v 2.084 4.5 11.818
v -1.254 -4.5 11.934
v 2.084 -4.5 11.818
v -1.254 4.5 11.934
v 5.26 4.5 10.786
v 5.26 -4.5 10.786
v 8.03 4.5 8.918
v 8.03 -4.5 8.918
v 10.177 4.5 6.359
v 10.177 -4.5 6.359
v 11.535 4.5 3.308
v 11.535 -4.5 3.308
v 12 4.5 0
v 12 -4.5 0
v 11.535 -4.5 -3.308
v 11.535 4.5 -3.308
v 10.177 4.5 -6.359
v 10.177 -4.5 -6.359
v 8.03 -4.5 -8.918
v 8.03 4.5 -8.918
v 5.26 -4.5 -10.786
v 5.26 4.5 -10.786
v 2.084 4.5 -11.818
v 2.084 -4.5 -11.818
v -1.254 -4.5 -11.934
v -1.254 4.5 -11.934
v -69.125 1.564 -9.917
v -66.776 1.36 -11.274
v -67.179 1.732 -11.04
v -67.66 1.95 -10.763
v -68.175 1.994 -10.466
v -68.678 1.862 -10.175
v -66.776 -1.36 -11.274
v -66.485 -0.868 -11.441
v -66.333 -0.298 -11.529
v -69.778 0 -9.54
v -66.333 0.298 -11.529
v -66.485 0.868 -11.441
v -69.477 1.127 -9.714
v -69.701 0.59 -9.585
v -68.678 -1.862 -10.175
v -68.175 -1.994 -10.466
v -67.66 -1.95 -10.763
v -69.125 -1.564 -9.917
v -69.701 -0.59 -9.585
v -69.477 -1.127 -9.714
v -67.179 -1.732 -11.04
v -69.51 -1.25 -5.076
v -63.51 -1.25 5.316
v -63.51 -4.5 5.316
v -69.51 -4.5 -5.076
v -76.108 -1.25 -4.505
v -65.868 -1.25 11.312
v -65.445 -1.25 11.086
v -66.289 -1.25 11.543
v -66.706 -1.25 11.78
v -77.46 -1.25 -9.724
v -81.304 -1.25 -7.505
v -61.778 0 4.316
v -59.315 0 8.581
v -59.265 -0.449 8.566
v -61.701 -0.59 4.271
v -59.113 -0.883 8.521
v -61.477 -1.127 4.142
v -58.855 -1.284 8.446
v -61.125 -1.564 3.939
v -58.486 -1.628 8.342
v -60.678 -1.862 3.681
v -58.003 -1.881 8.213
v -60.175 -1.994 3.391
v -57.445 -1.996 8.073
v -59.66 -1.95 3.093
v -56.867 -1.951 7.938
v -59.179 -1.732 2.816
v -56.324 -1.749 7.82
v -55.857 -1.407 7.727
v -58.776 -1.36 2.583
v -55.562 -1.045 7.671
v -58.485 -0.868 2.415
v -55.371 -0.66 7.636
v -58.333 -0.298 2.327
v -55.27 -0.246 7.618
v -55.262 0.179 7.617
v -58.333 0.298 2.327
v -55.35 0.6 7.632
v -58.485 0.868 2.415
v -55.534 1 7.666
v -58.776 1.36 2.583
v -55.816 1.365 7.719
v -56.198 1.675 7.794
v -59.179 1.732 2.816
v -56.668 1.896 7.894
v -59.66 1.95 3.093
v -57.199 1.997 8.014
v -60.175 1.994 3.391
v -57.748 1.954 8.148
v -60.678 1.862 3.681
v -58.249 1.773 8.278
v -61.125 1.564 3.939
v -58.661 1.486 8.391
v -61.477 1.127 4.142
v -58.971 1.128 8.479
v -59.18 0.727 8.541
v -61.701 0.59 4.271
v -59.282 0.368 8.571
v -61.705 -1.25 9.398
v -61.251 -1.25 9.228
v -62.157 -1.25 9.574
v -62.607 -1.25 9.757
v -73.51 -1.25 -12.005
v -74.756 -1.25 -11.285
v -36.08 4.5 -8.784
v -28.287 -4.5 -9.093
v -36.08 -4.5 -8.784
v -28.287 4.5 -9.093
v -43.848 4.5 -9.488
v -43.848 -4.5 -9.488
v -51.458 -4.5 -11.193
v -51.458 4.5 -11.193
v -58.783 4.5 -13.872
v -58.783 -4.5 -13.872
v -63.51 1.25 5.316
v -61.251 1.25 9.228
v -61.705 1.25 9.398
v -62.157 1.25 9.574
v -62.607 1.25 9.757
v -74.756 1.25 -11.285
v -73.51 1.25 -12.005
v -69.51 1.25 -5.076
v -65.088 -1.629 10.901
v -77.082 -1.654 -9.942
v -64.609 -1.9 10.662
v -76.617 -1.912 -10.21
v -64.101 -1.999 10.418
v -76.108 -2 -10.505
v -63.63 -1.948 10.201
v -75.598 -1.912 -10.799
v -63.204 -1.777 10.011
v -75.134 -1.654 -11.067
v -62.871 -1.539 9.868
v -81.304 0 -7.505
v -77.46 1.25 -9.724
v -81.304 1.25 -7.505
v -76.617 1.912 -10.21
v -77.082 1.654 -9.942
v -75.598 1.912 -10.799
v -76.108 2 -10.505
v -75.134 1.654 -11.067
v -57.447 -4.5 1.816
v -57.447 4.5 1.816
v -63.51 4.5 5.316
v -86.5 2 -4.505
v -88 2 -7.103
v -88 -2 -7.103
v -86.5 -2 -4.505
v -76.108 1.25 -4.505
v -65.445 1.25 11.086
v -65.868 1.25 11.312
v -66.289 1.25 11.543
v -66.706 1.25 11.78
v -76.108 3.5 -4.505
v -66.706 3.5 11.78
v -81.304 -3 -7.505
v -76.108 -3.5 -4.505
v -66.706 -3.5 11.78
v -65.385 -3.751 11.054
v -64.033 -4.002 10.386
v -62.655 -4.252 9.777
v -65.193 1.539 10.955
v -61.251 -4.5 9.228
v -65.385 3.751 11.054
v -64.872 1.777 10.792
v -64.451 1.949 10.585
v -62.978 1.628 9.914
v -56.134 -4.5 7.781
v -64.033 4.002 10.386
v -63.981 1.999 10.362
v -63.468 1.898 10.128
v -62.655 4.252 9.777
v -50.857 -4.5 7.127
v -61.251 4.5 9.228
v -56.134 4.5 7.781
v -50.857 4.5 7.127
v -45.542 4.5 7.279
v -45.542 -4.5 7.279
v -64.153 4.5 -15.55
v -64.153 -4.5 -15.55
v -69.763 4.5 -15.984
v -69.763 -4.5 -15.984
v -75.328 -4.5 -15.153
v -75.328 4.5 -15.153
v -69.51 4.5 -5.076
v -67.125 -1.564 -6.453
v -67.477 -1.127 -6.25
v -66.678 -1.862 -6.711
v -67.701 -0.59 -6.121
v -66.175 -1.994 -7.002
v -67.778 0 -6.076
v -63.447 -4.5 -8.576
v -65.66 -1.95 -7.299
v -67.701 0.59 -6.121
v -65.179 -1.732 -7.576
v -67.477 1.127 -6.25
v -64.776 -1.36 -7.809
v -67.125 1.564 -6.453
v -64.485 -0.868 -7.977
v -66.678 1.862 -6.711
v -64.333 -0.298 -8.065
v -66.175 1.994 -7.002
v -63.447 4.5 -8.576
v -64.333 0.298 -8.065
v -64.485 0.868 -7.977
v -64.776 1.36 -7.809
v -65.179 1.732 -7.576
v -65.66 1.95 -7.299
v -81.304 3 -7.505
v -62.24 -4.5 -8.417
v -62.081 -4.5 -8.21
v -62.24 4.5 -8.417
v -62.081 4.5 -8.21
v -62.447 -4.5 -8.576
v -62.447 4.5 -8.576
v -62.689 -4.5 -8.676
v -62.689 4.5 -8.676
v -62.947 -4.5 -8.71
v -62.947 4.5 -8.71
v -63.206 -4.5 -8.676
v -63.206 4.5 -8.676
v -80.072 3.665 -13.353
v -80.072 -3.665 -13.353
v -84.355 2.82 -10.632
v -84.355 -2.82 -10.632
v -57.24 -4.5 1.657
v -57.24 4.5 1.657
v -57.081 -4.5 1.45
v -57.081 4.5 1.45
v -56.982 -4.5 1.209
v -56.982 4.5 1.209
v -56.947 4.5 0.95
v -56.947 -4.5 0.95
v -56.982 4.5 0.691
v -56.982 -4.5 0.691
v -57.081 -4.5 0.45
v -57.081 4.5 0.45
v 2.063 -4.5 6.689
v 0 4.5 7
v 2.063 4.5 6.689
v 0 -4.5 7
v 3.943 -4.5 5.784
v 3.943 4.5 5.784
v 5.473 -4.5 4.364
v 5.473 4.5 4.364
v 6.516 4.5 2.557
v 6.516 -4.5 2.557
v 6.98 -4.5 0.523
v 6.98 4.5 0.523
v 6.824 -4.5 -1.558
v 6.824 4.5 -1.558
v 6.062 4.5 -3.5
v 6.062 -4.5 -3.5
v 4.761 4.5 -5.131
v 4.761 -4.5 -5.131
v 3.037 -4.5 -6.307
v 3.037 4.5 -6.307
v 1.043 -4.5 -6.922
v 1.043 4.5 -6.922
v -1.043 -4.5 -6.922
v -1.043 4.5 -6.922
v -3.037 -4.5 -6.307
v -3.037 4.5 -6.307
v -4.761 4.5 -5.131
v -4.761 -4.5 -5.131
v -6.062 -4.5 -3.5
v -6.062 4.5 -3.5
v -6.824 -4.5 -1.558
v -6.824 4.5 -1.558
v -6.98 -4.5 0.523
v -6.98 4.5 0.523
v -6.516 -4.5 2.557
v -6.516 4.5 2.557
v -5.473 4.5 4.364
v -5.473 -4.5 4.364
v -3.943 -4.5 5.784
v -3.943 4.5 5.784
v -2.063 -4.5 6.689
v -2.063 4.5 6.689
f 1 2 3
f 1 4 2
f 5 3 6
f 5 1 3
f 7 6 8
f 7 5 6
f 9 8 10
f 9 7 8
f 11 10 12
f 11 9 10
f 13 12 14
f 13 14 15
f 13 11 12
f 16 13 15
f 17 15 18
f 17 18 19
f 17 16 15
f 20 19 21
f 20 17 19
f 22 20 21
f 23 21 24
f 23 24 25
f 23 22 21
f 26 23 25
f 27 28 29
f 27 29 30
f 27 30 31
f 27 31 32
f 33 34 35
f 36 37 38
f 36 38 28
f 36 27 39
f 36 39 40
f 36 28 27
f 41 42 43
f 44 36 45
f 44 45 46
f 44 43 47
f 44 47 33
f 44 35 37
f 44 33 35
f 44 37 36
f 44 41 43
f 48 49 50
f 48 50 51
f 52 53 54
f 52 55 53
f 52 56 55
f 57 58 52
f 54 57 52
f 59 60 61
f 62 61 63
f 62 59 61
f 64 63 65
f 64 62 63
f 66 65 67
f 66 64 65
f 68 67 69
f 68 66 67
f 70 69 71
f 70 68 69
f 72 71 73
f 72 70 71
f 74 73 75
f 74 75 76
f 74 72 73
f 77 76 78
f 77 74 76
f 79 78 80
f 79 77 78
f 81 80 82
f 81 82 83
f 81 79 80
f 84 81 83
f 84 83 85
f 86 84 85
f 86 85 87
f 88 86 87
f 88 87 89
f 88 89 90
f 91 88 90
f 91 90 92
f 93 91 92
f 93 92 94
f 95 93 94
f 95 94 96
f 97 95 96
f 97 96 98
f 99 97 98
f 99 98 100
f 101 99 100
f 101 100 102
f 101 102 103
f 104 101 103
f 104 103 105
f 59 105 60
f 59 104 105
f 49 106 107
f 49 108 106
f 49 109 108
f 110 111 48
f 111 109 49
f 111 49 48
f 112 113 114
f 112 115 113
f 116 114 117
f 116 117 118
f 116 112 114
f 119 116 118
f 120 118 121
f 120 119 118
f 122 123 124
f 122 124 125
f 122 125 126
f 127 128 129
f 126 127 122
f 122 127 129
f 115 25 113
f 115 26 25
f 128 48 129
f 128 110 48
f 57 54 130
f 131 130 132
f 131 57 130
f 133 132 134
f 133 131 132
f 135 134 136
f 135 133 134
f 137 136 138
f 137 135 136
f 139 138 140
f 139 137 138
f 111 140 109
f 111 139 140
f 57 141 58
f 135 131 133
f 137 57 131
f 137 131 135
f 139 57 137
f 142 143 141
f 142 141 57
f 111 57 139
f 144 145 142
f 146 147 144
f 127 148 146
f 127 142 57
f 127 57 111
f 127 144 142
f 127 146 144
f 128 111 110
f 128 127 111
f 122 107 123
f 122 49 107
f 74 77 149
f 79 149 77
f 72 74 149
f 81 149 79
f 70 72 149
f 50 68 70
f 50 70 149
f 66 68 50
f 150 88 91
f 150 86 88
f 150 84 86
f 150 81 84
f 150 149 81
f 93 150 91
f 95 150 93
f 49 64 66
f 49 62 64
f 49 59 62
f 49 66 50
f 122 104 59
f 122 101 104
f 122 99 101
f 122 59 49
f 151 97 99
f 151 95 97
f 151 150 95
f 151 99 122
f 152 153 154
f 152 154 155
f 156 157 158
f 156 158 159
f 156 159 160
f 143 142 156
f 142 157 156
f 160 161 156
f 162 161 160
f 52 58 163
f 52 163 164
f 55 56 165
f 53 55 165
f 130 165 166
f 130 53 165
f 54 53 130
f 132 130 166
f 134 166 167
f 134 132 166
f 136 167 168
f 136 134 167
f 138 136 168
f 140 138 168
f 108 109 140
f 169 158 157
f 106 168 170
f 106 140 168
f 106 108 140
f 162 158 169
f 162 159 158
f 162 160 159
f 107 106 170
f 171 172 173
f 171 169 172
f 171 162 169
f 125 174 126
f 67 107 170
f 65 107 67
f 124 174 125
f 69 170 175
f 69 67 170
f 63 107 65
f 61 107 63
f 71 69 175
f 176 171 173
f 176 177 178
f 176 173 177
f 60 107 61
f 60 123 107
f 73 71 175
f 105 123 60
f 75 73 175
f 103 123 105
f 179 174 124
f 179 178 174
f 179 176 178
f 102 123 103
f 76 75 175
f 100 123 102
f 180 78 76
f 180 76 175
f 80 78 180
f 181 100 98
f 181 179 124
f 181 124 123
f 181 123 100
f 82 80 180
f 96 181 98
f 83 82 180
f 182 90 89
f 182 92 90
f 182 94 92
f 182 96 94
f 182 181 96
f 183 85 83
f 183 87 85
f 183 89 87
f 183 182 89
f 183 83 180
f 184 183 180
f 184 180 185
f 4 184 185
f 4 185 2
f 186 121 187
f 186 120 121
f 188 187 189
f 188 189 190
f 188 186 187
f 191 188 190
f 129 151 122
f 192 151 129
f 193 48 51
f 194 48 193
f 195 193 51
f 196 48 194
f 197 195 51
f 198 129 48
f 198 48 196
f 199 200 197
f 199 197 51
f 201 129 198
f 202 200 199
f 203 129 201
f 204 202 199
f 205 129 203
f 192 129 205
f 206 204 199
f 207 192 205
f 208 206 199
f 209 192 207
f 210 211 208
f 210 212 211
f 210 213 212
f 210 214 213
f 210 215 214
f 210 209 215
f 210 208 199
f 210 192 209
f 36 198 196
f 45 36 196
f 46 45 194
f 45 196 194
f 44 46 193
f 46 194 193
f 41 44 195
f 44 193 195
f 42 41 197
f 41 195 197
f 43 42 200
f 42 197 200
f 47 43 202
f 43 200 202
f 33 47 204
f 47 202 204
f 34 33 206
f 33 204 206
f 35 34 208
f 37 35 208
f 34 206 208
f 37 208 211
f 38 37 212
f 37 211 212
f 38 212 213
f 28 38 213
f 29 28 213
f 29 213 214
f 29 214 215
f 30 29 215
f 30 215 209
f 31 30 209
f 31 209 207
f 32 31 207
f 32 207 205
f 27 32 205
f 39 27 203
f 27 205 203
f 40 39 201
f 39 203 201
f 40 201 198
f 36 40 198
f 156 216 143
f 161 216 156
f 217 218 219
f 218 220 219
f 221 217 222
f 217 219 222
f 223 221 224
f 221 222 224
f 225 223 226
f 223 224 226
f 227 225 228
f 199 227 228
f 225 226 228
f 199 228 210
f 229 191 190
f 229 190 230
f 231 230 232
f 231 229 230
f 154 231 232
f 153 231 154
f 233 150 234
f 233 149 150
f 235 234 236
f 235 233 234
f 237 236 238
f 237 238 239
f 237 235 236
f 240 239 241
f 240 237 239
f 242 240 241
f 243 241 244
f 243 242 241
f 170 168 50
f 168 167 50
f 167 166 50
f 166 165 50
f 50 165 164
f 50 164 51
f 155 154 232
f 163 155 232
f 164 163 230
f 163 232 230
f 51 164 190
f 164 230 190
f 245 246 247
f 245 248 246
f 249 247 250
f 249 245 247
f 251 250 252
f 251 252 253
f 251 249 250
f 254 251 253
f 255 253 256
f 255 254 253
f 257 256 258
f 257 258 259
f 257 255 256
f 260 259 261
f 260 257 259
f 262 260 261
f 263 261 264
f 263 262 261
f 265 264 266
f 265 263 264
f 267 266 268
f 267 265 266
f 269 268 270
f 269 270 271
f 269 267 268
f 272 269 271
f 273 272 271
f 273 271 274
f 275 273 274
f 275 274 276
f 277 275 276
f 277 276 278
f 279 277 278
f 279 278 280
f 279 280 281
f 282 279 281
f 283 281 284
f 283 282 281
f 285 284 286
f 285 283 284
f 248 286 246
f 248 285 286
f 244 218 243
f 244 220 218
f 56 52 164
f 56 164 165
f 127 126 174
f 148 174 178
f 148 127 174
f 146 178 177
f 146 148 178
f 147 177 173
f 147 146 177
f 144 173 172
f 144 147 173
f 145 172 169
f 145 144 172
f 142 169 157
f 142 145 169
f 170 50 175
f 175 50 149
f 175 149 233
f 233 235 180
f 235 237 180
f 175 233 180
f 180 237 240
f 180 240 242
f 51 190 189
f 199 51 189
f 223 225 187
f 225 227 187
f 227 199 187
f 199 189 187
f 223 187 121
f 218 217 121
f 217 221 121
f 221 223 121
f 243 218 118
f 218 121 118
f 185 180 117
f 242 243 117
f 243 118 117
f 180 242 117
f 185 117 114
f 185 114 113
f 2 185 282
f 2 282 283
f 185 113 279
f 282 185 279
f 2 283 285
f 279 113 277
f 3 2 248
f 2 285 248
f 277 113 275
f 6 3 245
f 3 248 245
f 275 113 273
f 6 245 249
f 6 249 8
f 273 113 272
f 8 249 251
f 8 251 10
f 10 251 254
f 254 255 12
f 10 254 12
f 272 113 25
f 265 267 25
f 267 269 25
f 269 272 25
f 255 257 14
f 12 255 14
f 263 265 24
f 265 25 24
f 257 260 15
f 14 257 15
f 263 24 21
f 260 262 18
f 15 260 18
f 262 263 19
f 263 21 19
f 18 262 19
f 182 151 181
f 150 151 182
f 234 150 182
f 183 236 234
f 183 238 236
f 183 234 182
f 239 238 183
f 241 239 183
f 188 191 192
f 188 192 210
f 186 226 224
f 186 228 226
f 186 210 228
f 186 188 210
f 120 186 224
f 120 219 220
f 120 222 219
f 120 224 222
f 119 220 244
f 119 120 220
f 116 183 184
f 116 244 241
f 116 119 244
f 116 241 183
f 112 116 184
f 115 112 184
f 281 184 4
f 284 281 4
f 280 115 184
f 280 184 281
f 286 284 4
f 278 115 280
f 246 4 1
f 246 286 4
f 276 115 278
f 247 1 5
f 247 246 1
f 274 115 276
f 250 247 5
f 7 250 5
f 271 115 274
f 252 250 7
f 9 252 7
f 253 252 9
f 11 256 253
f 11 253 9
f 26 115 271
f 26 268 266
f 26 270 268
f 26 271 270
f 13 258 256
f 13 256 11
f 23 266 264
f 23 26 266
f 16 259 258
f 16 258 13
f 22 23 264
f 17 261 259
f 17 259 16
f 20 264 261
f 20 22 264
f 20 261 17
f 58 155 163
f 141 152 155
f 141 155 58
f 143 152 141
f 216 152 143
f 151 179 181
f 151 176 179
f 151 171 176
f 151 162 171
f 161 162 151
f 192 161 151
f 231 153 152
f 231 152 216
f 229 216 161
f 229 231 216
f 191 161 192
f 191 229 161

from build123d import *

# Parameters (mm, degrees)
SKETCH1_R                           = 7
BOSS_EXTRUDE1_DEPTH                 = 4.5
SKETCH2_R                           = 2
CUT_EXTRUDE1_DEPTH                  = 4
CUT_EXTRUDE1_DIRECTION_2_REACH      = 84.52
CUT_EXTRUDE1_DIRECTION_2_END_RADIUS = 35
CUT_EXTRUDE2_REACH                  = 85.44
CUT_EXTRUDE3_DEPTH                  = 84.439778024
CUT_EXTRUDE3_DEPTH_BACK             = 84.439778024
FILLET1_R                           = 1


with BuildPart() as part:
    # Sketch1 → Boss-Extrude1 (new, symmetric)
    # profile 1 of 2: a face of its own
    with BuildSketch(Plane(origin=(0, 0, 0), x_dir=(1, 0, 0), z_dir=(0, 1, 0))):
        with BuildLine():
            Line((-1.254341559, 11.934262744), (-28.287114055, 9.093003864))
            ThreePointArc((-28.287114055, 9.093003864), (-43.847711602, 9.487707298), (-58.78314626, 13.871858114))
            ThreePointArc((-58.78314626, 13.871858114), (-66.945926578, 15.925337372), (-75.327562788, 15.153369736))
            Line((-75.327562788, 15.153369736), (-69.509618943, 5.076395401))
            Line((-69.509618943, 5.076395401), (-62.581415713, 9.076395401))
            Line((-62.581415713, 9.076395401), (-56.581415713, -1.315909444))
            Line((-56.581415713, -1.315909444), (-63.509618943, -5.315909444))
            Line((-63.509618943, -5.315909444), (-61.251109949, -9.227761772))
            ThreePointArc((-61.251109949, -9.227761772), (-53.508040015, -7.353839298), (-45.541787079, -7.279464651))
            Line((-45.541787079, -7.279464651), (-1.254341559, -11.934262744))
            ThreePointArc((-1.254341559, -11.934262744), (12, 0), (-1.254341559, 11.934262744))
        make_face()
        with Locations(Location((0, 0, 0), (0, 0, 270))):
            Circle(SKETCH1_R, mode=Mode.SUBTRACT)
    # profile 2 of 2: a face of its own
    with BuildSketch(Plane(origin=(0, 0, 0), x_dir=(1, 0, 0), z_dir=(0, 1, 0))):
        with BuildLine():
            Line((-69.509618943, 5.076395401), (-75.327562788, 15.153369736))
            ThreePointArc((-75.327562788, 15.153369736), (-82.282399056, 12.101775932), (-88, 7.102674843))
            Line((-88, 7.102674843), (-86.5, 4.504598631))
            Line((-86.5, 4.504598631), (-81.303847577, 7.504598631))
            Line((-81.303847577, 7.504598631), (-76.107695155, 4.504598631))
            Line((-76.107695155, 4.504598631), (-66.705771366, -11.78001106))
            ThreePointArc((-66.705771366, -11.78001106), (-64.033436336, -10.386349776), (-61.251109949, -9.227761772))
            Line((-61.251109949, -9.227761772), (-63.509618943, -5.315909444))
            Line((-63.509618943, -5.315909444), (-69.509618943, 5.076395401))
        make_face()
    extrude(amount=BOSS_EXTRUDE1_DEPTH, both=True)

    # Sketch2 → Cut-Extrude1 (cut)
    with BuildSketch(Plane(origin=(-19.575548424, 0, -33.905844457), x_dir=(0.8660254037844372, 0, -0.5000000000000027), z_dir=(0.5000000000000027, 0, 0.8660254037844372))):
        with Locations(Location((-53.658898112, 0, 0), (0, 0, 180))):
            Circle(SKETCH2_R)
    extrude(amount=-CUT_EXTRUDE1_DEPTH, mode=Mode.SUBTRACT)

    # Cut-Extrude1 direction 2: up to this cylinder (the profile starts outside it)
    cut_extrude1_direction_2_end = Plane(origin=(-49.200283293, 0, 42.087730989), z_dir=(0, -1, 0)) * Cylinder(CUT_EXTRUDE1_DIRECTION_2_END_RADIUS, 240.04, mode=Mode.PRIVATE)
    # Sketch2 → Cut-Extrude1 direction 2 (cut, up to the surface)
    with BuildSketch(Plane(origin=(-19.575548424, 0, -33.905844457), x_dir=(0.8660254037844372, 0, -0.5000000000000027), z_dir=(0.5000000000000027, 0, 0.8660254037844372)), mode=Mode.PRIVATE) as cut_extrude1_direction_2_sk1:
        with Locations(Location((-53.658898112, 0, 0), (0, 0, 180))):
            Circle(SKETCH2_R)
    cut_extrude1_direction_2_tool1 = extrude(cut_extrude1_direction_2_sk1.sketch, amount=CUT_EXTRUDE1_DIRECTION_2_REACH, mode=Mode.PRIVATE) - cut_extrude1_direction_2_end
    add(cut_extrude1_direction_2_tool1.solids().sort_by_distance((-66.045517, 0, -7.076395))[0], mode=Mode.SUBTRACT)

    # Sketch3 → Cut-Extrude2 (cut, up to next)
    with BuildSketch(Plane(origin=(-23.575548424, 0, -40.834047687), x_dir=(0.8660254037844374, 0, -0.5000000000000023), z_dir=(0.5000000000000023, 0, 0.8660254037844374)), mode=Mode.PRIVATE) as cut_extrude2_sk1:
        with BuildLine():
            ThreePointArc((-62.220147611, 1.25), (-62.546025426, 0.662382443), (-62.658898112, 0))
            Line((-62.658898112, 0), (-58.658898112, 0))
            ThreePointArc((-58.658898112, 0), (-58.771770798, 0.662382443), (-59.097648612, 1.25))
            ThreePointArc((-59.097648612, 1.25), (-60.658898112, 2), (-62.220147611, 1.25))
        make_face()
    cut_extrude2_tool1 = extrude(cut_extrude2_sk1.sketch, amount=CUT_EXTRUDE2_REACH, mode=Mode.PRIVATE) & part.part
    # Sketch3 → Cut-Extrude2 (cut, up to next)
    with BuildSketch(Plane(origin=(-23.575548424, 0, -40.834047687), x_dir=(0.8660254037844374, 0, -0.5000000000000023), z_dir=(0.5000000000000023, 0, 0.8660254037844374)), mode=Mode.PRIVATE) as cut_extrude2_sk2:
        with BuildLine():
            Line((-58.658898112, 0), (-62.658898112, 0))
            ThreePointArc((-62.658898112, 0), (-62.546025426, -0.662382443), (-62.220147611, -1.25))
            ThreePointArc((-62.220147611, -1.25), (-60.658898112, -2), (-59.097648612, -1.25))
            ThreePointArc((-59.097648612, -1.25), (-58.771770798, -0.662382443), (-58.658898112, 0))
        make_face()
    cut_extrude2_tool2 = extrude(cut_extrude2_sk2.sketch, amount=CUT_EXTRUDE2_REACH, mode=Mode.PRIVATE) & part.part
    # Sketch3 → Cut-Extrude2 (cut, up to next)
    with BuildSketch(Plane(origin=(-23.575548424, 0, -40.834047687), x_dir=(0.8660254037844374, 0, -0.5000000000000023), z_dir=(0.5000000000000023, 0, 0.8660254037844374)), mode=Mode.PRIVATE) as cut_extrude2_sk3:
        with BuildLine():
            ThreePointArc((-62.220147611, 1.25), (-62.546025426, 0.662382443), (-62.658898112, 0))
            Line((-62.658898112, 0), (-58.658898112, 0))
            ThreePointArc((-58.658898112, 0), (-58.771770798, 0.662382443), (-59.097648612, 1.25))
            ThreePointArc((-59.097648612, 1.25), (-60.658898112, 2), (-62.220147611, 1.25))
        make_face()
    cut_extrude2_tool3 = extrude(cut_extrude2_sk3.sketch, amount=CUT_EXTRUDE2_REACH, mode=Mode.PRIVATE) & part.part
    # Sketch3 → Cut-Extrude2 (cut, up to next)
    with BuildSketch(Plane(origin=(-23.575548424, 0, -40.834047687), x_dir=(0.8660254037844374, 0, -0.5000000000000023), z_dir=(0.5000000000000023, 0, 0.8660254037844374)), mode=Mode.PRIVATE) as cut_extrude2_sk4:
        with BuildLine():
            Line((-58.658898112, 0), (-62.658898112, 0))
            ThreePointArc((-62.658898112, 0), (-62.546025426, -0.662382443), (-62.220147611, -1.25))
            ThreePointArc((-62.220147611, -1.25), (-60.658898112, -2), (-59.097648612, -1.25))
            ThreePointArc((-59.097648612, -1.25), (-58.771770798, -0.662382443), (-58.658898112, 0))
        make_face()
    cut_extrude2_tool4 = extrude(cut_extrude2_sk4.sketch, amount=CUT_EXTRUDE2_REACH, mode=Mode.PRIVATE) & part.part
    # Sketch3 → Cut-Extrude2 (cut, up to next)
    with BuildSketch(Plane(origin=(-23.575548424, 0, -40.834047687), x_dir=(0.8660254037844374, 0, -0.5000000000000023), z_dir=(0.5000000000000023, 0, 0.8660254037844374)), mode=Mode.PRIVATE) as cut_extrude2_sk5:
        with BuildLine():
            Line((-66.658898112, 1.25), (-66.658898112, 0))
            Line((-66.658898112, 0), (-62.658898112, 0))
            ThreePointArc((-62.658898112, 0), (-62.546025426, 0.662382443), (-62.220147611, 1.25))
            Line((-62.220147611, 1.25), (-66.658898112, 1.25))
        make_face()
    cut_extrude2_tool5 = extrude(cut_extrude2_sk5.sketch, amount=CUT_EXTRUDE2_REACH, mode=Mode.PRIVATE) & part.part
    # Sketch3 → Cut-Extrude2 (cut, up to next)
    with BuildSketch(Plane(origin=(-23.575548424, 0, -40.834047687), x_dir=(0.8660254037844374, 0, -0.5000000000000023), z_dir=(0.5000000000000023, 0, 0.8660254037844374)), mode=Mode.PRIVATE) as cut_extrude2_sk6:
        with BuildLine():
            Line((-62.658898112, 0), (-66.658898112, 0))
            Line((-66.658898112, 0), (-66.658898112, -1.25))
            Line((-66.658898112, -1.25), (-62.220147611, -1.25))
            ThreePointArc((-62.220147611, -1.25), (-62.546025426, -0.662382443), (-62.658898112, 0))
        make_face()
    cut_extrude2_tool6 = extrude(cut_extrude2_sk6.sketch, amount=CUT_EXTRUDE2_REACH, mode=Mode.PRIVATE) & part.part
    # Sketch3 → Cut-Extrude2 (cut, up to next)
    with BuildSketch(Plane(origin=(-23.575548424, 0, -40.834047687), x_dir=(0.8660254037844374, 0, -0.5000000000000023), z_dir=(0.5000000000000023, 0, 0.8660254037844374)), mode=Mode.PRIVATE) as cut_extrude2_sk7:
        with BuildLine():
            ThreePointArc((-59.097648612, 1.25), (-58.771770798, 0.662382443), (-58.658898112, 0))
            Line((-58.658898112, 0), (-57.658898112, 0))
            Line((-57.658898112, 0), (-57.658898112, 1.25))
            Line((-57.658898112, 1.25), (-59.097648612, 1.25))
        make_face()
    cut_extrude2_tool7 = extrude(cut_extrude2_sk7.sketch, amount=CUT_EXTRUDE2_REACH, mode=Mode.PRIVATE) & part.part
    # Sketch3 → Cut-Extrude2 (cut, up to next)
    with BuildSketch(Plane(origin=(-23.575548424, 0, -40.834047687), x_dir=(0.8660254037844374, 0, -0.5000000000000023), z_dir=(0.5000000000000023, 0, 0.8660254037844374)), mode=Mode.PRIVATE) as cut_extrude2_sk8:
        with BuildLine():
            Line((-57.658898112, 0), (-58.658898112, 0))
            ThreePointArc((-58.658898112, 0), (-58.771770798, -0.662382443), (-59.097648612, -1.25))
            Line((-59.097648612, -1.25), (-57.658898112, -1.25))
            Line((-57.658898112, -1.25), (-57.658898112, 0))
        make_face()
    cut_extrude2_tool8 = extrude(cut_extrude2_sk8.sketch, amount=CUT_EXTRUDE2_REACH, mode=Mode.PRIVATE) & part.part
    add(cut_extrude2_tool1.solids().sort_by_distance((-76.107695, 0.848826, -10.504599))[0], mode=Mode.SUBTRACT)
    add(cut_extrude2_tool2.solids().sort_by_distance((-76.107695, -0.848826, -10.504599))[0], mode=Mode.SUBTRACT)
    add(cut_extrude2_tool3.solids().sort_by_distance((-76.107695, 0.848826, -10.504599))[0], mode=Mode.SUBTRACT)
    add(cut_extrude2_tool4.solids().sort_by_distance((-76.107695, -0.848826, -10.504599))[0], mode=Mode.SUBTRACT)
    add(cut_extrude2_tool5.solids().sort_by_distance((-79.509815, 0.635751, -8.540384))[0], mode=Mode.SUBTRACT)
    add(cut_extrude2_tool6.solids().sort_by_distance((-79.509815, -0.635751, -8.540384))[0], mode=Mode.SUBTRACT)
    add(cut_extrude2_tool7.solids().sort_by_distance((-74.009148, 0.664064, -11.716195))[0], mode=Mode.SUBTRACT)
    add(cut_extrude2_tool8.solids().sort_by_distance((-74.009148, -0.664064, -11.716195))[0], mode=Mode.SUBTRACT)

    # Sketch4 → Cut-Extrude3 (cut, two sides: drawn at the far end of the back side and taken through both)
    with BuildSketch(Plane(origin=(-23.575548424, 0, -40.834047687), x_dir=(0.8660254037844374, 0, -0.5000000000000023), z_dir=(0.5000000000000023, 0, 0.8660254037844374)).offset(-CUT_EXTRUDE3_DEPTH_BACK)):
        Polygon((-57.658898112, 4.5), (-72.658898112, 4.5), (-72.658898112, 2), align=None)
        Polygon((-57.658898112, -4.5), (-72.658898112, -4.5), (-72.658898112, -2), align=None)
    extrude(amount=CUT_EXTRUDE3_DEPTH + CUT_EXTRUDE3_DEPTH_BACK, mode=Mode.SUBTRACT)

    # Fillet1
    fillet1_edges = [part.edges().sort_by_distance(p)[0] for p in [
        (-56.581415713, 0, 1.315909444),
        (-62.581415713, 0, -9.076395401),
    ]]
    fillet(fillet1_edges, radius=FILLET1_R)


solid = part.part
